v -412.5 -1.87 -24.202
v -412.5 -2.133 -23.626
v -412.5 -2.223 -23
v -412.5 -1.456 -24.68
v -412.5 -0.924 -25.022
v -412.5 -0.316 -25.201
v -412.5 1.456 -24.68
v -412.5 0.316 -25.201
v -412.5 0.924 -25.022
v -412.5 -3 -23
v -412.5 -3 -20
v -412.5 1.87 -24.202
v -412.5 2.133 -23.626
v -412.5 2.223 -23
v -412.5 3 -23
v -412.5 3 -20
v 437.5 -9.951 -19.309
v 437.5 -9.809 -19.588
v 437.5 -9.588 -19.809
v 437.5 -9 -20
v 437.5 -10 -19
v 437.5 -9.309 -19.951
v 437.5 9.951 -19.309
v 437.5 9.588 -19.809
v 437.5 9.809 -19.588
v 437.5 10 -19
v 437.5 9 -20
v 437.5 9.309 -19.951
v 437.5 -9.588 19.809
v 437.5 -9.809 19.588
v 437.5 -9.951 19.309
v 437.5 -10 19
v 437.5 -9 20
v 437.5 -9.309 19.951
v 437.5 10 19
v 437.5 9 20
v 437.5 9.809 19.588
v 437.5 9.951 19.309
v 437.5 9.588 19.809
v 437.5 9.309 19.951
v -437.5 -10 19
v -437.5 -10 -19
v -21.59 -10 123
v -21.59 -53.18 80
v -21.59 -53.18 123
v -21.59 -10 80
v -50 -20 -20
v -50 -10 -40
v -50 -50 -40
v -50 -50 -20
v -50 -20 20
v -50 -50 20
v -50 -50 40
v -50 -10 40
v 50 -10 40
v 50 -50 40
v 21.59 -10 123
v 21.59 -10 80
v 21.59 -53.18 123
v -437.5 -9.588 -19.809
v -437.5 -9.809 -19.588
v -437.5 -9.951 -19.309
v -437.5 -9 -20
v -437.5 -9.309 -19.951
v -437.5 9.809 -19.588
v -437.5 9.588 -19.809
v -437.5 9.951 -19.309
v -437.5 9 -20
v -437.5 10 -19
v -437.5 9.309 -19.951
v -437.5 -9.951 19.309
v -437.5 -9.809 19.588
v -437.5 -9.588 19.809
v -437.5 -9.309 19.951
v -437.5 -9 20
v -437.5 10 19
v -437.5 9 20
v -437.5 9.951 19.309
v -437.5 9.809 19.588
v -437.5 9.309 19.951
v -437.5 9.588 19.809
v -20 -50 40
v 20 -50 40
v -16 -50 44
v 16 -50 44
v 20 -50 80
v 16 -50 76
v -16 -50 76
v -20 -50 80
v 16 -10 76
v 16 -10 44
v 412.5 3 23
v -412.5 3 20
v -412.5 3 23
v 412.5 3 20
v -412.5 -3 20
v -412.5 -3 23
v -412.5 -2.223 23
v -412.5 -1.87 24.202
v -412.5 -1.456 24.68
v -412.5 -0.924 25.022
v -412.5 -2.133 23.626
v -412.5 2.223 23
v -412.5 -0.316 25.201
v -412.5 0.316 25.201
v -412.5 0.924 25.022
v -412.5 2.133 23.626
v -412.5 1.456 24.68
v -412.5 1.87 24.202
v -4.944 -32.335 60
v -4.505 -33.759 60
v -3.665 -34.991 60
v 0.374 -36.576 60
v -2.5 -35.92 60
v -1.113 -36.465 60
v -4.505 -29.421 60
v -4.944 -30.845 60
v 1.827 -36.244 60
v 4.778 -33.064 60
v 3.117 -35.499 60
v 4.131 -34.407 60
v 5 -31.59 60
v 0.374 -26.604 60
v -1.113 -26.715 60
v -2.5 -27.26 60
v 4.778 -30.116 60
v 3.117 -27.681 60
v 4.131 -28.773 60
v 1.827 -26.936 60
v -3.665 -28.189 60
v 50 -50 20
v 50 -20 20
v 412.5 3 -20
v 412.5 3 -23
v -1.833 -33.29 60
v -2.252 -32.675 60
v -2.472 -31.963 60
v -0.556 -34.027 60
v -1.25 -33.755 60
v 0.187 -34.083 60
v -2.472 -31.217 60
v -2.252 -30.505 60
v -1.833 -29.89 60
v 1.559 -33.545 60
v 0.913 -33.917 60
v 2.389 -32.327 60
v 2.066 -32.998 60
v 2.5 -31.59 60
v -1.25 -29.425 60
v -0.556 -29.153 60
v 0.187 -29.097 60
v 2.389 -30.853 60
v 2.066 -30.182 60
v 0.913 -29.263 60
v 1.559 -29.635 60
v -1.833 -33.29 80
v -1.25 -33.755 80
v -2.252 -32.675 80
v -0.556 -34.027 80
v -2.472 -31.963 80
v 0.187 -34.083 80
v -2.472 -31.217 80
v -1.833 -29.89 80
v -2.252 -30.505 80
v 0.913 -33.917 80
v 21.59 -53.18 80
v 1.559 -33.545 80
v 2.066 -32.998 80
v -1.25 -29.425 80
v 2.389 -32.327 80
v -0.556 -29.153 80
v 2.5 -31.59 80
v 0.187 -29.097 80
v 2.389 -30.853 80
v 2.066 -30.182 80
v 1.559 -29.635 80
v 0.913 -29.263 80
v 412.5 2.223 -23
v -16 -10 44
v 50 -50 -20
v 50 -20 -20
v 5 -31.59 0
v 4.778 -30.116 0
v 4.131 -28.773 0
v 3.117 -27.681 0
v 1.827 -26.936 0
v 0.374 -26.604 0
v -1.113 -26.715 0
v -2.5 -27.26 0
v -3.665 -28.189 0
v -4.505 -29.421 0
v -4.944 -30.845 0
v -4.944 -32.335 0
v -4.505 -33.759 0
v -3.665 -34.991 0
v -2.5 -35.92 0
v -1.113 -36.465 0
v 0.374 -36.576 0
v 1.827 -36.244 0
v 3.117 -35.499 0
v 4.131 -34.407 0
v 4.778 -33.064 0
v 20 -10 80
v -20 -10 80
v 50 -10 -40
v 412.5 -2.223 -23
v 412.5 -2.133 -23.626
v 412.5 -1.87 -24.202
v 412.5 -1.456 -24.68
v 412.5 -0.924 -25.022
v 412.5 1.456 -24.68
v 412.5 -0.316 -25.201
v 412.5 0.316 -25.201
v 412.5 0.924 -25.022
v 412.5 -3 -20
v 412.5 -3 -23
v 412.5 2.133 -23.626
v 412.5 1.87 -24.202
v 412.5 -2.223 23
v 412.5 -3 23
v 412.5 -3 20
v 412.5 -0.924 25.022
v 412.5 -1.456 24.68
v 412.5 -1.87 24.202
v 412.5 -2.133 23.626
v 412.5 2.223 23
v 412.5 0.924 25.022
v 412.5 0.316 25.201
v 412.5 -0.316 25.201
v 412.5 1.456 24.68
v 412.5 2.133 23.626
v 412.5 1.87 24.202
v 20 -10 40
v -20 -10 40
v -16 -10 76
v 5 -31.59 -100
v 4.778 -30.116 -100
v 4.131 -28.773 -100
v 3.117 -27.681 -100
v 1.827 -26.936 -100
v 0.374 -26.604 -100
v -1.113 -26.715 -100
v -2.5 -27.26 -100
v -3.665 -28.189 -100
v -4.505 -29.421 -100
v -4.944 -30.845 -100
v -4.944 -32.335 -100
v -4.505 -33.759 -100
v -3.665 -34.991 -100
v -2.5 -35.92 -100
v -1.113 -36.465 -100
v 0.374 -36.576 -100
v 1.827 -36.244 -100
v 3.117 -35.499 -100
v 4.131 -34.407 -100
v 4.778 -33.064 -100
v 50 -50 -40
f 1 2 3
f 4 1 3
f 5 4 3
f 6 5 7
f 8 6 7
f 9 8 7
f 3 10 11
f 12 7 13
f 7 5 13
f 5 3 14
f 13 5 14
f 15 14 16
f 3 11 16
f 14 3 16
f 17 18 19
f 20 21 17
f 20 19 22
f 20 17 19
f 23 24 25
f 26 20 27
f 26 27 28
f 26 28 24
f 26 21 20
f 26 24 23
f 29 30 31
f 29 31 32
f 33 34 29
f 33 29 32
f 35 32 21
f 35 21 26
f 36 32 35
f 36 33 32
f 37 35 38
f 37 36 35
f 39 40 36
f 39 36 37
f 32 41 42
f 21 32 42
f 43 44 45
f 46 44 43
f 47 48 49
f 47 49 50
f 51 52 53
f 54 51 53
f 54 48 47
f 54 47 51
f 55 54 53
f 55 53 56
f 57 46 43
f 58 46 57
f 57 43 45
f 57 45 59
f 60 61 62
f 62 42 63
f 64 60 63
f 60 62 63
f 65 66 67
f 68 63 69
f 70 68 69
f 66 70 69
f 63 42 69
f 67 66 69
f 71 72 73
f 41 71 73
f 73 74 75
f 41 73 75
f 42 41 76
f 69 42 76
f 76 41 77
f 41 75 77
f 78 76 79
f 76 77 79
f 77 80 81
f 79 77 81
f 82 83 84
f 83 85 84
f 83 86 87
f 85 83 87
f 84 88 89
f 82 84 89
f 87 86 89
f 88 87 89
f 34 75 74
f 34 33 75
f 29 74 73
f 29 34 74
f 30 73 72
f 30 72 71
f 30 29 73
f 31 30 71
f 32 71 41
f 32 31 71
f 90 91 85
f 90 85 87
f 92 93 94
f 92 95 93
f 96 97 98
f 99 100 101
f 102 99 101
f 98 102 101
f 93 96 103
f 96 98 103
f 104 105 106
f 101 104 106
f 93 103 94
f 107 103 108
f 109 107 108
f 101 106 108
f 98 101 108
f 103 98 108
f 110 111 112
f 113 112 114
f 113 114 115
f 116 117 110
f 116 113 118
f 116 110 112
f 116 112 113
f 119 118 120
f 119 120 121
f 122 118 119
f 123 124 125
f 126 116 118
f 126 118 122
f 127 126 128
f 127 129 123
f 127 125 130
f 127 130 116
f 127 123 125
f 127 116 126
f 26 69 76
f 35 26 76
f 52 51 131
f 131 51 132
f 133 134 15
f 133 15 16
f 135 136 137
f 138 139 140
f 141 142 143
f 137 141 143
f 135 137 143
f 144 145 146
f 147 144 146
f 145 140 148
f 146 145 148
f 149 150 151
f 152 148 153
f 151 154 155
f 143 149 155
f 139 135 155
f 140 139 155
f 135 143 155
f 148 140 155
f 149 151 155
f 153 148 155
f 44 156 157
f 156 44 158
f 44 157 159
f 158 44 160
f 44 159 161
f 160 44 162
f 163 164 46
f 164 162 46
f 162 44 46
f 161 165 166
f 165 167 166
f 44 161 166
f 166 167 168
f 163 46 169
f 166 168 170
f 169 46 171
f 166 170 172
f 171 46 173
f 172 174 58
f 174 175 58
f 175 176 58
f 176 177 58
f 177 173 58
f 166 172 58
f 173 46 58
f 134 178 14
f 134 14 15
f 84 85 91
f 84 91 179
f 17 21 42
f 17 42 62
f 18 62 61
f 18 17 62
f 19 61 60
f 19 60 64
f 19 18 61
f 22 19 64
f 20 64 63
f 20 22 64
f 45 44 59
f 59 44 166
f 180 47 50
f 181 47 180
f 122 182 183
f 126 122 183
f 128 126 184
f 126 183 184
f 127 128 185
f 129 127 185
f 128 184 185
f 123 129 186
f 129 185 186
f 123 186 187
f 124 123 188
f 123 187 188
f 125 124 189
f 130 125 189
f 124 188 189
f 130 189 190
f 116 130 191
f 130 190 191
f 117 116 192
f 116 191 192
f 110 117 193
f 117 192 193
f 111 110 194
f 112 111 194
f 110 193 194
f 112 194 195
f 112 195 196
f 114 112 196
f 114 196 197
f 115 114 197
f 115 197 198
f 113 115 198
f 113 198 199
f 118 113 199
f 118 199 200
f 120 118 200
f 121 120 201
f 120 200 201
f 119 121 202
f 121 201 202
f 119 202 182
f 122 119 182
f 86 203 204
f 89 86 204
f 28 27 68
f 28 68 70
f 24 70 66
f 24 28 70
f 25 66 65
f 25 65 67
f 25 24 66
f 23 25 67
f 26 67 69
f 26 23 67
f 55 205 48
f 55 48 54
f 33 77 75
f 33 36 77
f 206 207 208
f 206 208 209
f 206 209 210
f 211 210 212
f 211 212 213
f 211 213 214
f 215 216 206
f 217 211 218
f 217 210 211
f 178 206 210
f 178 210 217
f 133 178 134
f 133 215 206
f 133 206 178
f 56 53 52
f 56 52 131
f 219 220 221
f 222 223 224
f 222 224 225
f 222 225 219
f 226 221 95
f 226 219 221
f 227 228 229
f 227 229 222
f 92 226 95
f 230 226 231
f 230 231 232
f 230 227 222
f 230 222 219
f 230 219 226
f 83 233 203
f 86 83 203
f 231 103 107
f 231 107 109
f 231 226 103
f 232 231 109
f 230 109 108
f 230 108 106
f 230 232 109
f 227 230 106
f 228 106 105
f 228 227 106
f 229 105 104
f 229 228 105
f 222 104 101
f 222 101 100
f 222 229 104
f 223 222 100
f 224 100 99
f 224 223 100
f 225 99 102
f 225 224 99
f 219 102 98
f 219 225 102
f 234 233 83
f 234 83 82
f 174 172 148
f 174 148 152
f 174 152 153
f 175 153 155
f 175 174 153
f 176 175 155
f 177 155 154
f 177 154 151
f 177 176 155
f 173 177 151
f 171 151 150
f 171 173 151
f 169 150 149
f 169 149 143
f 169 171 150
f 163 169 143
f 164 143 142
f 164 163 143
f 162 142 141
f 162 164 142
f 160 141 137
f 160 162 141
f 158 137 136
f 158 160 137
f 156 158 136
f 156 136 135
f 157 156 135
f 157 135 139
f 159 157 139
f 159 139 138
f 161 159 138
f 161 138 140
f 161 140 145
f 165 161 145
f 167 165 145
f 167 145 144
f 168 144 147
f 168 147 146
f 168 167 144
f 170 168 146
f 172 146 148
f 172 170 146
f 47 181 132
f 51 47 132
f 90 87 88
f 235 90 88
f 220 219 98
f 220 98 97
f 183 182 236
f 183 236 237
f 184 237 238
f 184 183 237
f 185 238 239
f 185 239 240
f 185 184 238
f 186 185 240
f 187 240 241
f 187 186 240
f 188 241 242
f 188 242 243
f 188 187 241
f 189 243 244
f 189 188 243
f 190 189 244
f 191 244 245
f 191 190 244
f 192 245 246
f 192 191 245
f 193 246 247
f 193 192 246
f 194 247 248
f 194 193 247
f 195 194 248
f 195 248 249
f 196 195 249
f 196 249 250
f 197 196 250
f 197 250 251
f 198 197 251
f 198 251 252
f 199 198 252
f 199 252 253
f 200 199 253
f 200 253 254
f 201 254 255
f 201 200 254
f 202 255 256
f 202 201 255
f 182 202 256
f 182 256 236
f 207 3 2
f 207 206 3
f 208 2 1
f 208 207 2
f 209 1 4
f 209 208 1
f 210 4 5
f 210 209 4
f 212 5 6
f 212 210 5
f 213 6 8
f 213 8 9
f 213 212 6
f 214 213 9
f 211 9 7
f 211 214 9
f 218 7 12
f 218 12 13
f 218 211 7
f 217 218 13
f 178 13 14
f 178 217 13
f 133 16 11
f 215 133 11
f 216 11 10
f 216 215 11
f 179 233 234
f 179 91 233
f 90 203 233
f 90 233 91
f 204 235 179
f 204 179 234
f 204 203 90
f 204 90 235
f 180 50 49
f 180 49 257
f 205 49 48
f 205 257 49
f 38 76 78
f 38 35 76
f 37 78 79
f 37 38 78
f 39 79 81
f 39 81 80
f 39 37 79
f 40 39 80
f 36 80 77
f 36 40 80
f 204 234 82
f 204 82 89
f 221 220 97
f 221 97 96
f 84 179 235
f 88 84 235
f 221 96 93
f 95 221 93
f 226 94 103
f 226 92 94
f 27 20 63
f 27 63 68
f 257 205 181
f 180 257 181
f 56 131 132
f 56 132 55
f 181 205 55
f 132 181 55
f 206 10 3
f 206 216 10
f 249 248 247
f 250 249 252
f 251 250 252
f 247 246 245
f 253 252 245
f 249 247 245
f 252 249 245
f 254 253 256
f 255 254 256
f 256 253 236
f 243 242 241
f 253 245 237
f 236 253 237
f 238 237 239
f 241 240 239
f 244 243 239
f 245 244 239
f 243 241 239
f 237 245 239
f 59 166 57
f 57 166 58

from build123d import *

# Parameters (mm, degrees)
F2_DEPTH      = 437.5
F3_DEPTH      = 412.5
F1_W          = 10
F1_H          = 80
F4_DEPTH      = 50
F5_W          = 40
F5_H          = 40
F5_W_2        = 32
F5_H_2        = 32
F6_DEPTH      = 40
F8_R          = 5
F9_DEPTH      = 100
F9_DEPTH_BACK = 60
F7_W          = 43.18
F7_H          = 43.18
F7_R          = 2.5
F10_DEPTH     = 43
F11_DEPTH     = 20
F12_W         = 100
F12_H         = 20
F13_DEPTH     = 30


with BuildPart() as f2:
    # F0 (on Right) → F2 (new body, symmetric)
    with BuildSketch(Plane.YZ):
        with BuildLine():
            Line((-3, 20), (-9, 20))
            ThreePointArc((-9, 20), (-9.7071067812, 19.7071067812), (-10, 19))
            Line((-10, 19), (-10, -19))
            ThreePointArc((-10, -19), (-9.7071067812, -19.7071067812), (-9, -20))
            Line((-9, -20), (-3, -20))
            Line((-3, -20), (3, -20))
            Line((3, -20), (9, -20))
            ThreePointArc((9, -20), (9.7071067812, -19.7071067812), (10, -19))
            Line((10, -19), (10, 19))
            ThreePointArc((10, 19), (9.7071067812, 19.7071067812), (9, 20))
            Line((9, 20), (3, 20))
            Line((3, 20), (-3, 20))
        make_face()
    extrude(amount=F2_DEPTH, both=True)


with BuildPart() as f3:
    # F0 (on Right) → F3 (new body, symmetric)
    with BuildSketch(Plane.YZ):
        with BuildLine():
            ThreePointArc((2.2231295841, 23), (0, 25.2231295841), (-2.2231295841, 23))
            Line((-2.2231295841, 23), (2.2231295841, 23))
        make_face()
        with BuildLine():
            Line((2.2231295841, 23), (-2.2231295841, 23))
            ThreePointArc((-2.2231295841, 23), (0, 20.7768704159), (2.2231295841, 23))
        make_face()
        with BuildLine():
            Line((-3, 23), (-3, 20))
            Line((-3, 20), (3, 20))
            Line((3, 20), (3, 23))
            Line((3, 23), (2.2231295841, 23))
            ThreePointArc((2.2231295841, 23), (0, 20.7768704159), (-2.2231295841, 23))
            Line((-2.2231295841, 23), (-3, 23))
        make_face()
    extrude(amount=F3_DEPTH, both=True)


with BuildPart() as f3b:
    # F0 (on Right) → F3, piece 2 (new body, symmetric)
    with BuildSketch(Plane.YZ):
        with BuildLine():
            Line((2.2231295841, -23), (-2.2231295841, -23))
            ThreePointArc((-2.2231295841, -23), (0, -25.2231295841), (2.2231295841, -23))
        make_face()
        with BuildLine():
            Line((3, -20), (-3, -20))
            Line((-3, -20), (-3, -23))
            Line((-3, -23), (-2.2231295841, -23))
            ThreePointArc((-2.2231295841, -23), (0, -20.7768704159), (2.2231295841, -23))
            Line((2.2231295841, -23), (3, -23))
            Line((3, -23), (3, -20))
        make_face()
        with BuildLine():
            ThreePointArc((2.2231295841, -23), (0, -20.7768704159), (-2.2231295841, -23))
            Line((-2.2231295841, -23), (2.2231295841, -23))
        make_face()
    extrude(amount=F3_DEPTH, both=True)


with BuildPart() as f4:
    # F1 (on Right) → F4 (new body, symmetric)
    with BuildSketch(Plane.YZ):
        with Locations((-15, 0)):
            Rectangle(F1_W, F1_H)
    extrude(amount=F4_DEPTH, both=True)

    # F12 (on face) → F13 (join)
    with BuildSketch(Plane.XZ.offset(20)):
        with Locations((0, 30)):
            Rectangle(F12_W, F12_H)
        with Locations((0, -30)):
            Rectangle(F12_W, F12_H)
    extrude(amount=F13_DEPTH)


with BuildPart() as f6:
    # F5 (on face) → F6 (new body)
    with BuildSketch(Plane(origin=(0, -10, 0), x_dir=(-1, 0, 0), z_dir=(0, 1, 0))):
        with Locations((0, 60)):
            Rectangle(F5_W, F5_H)
        with Locations((0, 60)):
            Rectangle(F5_W_2, F5_H_2, mode=Mode.SUBTRACT)
    extrude(amount=-F6_DEPTH)


with BuildPart() as f9:
    # F8 (on Top) → F9 (new body, two sides)
    with BuildSketch(Plane.XY) as f9_sk:
        with Locations((0, -31.59)):
            Circle(F8_R)
    extrude(amount=-F9_DEPTH)
    extrude(f9_sk.sketch, amount=F9_DEPTH_BACK)


with BuildPart() as f10:
    # F7 (on face) → F10 (new body)
    with BuildSketch(Plane.XY.offset(80)):
        with Locations((0, -31.59)):
            Rectangle(F7_W, F7_H)
        with Locations((0, -31.59)):
            Circle(F7_R, mode=Mode.SUBTRACT)
        with Locations((0, -31.59)):
            Circle(F7_R)
    extrude(amount=F10_DEPTH)

    # F7 (on face) → F11 (join)
    with BuildSketch(Plane.XY.offset(80)):
        with Locations((0, -31.59)):
            Circle(F7_R)
    extrude(amount=-F11_DEPTH)


solid = Compound([f2.part, f3.part, f3b.part, f4.part, f6.part, f9.part, f10.part])
